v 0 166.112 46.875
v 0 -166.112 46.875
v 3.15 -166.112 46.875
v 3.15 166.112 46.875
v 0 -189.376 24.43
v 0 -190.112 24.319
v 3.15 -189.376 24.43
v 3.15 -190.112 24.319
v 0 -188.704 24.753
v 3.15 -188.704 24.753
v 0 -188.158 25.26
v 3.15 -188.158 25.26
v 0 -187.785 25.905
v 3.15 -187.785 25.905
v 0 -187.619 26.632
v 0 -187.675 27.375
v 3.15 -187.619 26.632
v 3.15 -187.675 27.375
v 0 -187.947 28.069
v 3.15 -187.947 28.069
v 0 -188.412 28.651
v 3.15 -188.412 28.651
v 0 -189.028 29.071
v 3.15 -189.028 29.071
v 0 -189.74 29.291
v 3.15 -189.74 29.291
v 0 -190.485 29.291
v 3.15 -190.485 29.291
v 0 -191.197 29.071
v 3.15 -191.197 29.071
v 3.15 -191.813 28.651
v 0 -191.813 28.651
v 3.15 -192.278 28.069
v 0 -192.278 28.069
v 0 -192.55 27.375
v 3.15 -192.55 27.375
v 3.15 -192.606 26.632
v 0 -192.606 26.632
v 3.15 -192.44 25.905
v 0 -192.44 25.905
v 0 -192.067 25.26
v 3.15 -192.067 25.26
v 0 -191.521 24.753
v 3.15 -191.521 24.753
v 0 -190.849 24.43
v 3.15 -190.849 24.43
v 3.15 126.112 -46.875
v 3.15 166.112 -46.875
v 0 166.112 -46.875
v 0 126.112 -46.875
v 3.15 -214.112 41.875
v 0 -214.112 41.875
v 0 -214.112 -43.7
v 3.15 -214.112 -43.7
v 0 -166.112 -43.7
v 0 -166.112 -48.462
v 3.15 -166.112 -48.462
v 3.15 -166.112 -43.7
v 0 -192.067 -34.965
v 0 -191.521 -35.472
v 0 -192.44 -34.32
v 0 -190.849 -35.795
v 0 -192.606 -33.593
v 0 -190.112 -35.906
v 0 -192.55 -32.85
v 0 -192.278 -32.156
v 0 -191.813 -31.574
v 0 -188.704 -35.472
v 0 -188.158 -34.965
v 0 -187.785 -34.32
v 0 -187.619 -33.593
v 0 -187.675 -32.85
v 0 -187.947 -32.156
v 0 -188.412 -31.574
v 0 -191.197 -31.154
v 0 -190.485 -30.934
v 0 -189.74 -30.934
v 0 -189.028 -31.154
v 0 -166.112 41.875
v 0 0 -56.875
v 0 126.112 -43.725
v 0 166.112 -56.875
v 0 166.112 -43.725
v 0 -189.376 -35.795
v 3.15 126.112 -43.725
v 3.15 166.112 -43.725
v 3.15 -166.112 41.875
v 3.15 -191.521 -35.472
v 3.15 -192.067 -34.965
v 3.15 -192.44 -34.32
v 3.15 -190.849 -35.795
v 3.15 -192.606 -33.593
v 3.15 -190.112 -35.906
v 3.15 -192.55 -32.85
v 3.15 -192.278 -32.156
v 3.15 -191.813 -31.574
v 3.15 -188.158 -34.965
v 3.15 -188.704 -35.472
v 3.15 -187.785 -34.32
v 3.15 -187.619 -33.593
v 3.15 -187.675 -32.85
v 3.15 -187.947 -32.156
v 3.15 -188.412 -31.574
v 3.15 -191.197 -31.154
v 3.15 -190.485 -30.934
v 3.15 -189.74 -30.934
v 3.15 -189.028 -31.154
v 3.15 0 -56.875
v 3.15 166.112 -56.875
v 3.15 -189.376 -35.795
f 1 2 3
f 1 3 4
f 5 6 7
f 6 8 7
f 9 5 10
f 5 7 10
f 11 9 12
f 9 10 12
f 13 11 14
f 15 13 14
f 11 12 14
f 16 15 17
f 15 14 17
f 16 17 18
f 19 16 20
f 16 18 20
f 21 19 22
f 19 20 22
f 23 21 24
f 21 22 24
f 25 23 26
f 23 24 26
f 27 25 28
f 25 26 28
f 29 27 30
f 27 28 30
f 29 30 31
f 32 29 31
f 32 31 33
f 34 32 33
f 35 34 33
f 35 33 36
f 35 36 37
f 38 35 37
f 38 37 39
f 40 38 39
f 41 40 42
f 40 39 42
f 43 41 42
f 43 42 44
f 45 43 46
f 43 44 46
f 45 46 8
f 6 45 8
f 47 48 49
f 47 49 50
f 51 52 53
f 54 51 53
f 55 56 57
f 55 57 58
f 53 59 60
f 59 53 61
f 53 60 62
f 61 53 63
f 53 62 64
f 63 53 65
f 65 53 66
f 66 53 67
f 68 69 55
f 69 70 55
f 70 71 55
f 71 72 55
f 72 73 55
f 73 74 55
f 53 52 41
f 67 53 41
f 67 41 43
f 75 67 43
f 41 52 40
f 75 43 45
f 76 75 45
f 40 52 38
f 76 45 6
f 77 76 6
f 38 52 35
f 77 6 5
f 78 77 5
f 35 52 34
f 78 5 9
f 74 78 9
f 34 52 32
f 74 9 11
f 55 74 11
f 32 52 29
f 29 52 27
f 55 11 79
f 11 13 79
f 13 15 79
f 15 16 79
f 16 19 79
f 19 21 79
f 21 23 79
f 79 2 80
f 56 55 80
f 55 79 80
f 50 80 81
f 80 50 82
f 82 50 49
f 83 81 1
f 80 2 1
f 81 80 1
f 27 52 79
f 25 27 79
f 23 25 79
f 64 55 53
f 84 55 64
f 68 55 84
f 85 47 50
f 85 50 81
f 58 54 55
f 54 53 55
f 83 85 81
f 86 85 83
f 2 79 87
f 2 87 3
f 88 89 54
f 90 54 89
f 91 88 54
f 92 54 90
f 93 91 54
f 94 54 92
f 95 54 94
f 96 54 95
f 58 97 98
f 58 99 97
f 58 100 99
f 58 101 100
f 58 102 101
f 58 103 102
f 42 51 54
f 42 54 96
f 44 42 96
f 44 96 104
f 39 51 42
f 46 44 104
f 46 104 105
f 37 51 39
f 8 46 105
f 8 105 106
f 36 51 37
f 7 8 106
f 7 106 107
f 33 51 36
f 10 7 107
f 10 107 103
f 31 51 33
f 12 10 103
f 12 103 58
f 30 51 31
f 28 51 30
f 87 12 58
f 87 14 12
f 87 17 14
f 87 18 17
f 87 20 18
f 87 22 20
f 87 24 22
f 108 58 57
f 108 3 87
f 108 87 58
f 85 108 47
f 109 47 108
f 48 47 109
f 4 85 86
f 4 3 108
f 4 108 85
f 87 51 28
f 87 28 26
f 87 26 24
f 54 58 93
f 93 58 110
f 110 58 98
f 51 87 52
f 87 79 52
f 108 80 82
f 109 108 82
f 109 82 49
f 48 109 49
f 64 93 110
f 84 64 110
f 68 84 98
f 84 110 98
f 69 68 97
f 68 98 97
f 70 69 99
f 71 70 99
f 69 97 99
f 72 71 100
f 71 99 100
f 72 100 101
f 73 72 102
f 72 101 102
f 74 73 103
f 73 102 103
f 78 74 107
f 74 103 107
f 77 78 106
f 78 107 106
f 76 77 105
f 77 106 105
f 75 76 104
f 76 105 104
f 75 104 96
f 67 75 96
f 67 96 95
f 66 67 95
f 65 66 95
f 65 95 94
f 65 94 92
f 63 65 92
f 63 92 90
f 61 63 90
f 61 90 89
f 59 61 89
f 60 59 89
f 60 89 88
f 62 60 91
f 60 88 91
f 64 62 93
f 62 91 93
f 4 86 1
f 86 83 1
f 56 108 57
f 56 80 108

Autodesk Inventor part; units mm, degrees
ref_plane "YZ Plane" through (0, 0, 0) normal (1, 0, 0) x (0, 1, 0)
ref_plane "XZ Plane" through (0, 0, 0) normal (0, 1, 0) x (-1, 0, 0)
ref_plane "XY Plane" through (0, 0, 0) normal (0, 0, 1) x (1, 0, 0)
sketch "Sketch2" plane through (0, 0, 0) normal (1, 0, 0) x (0, 1, 0)
  line L0 (166.1125, -46.875) -> (-166.1125, -46.875)
  line L1 (-166.1125, -46.875) -> (-166.1125, 46.875)
  line L2 (-166.1125, 46.875) -> (166.1125, 46.875)
  line L3 (166.1125, 46.875) -> (166.1125, -46.875)
  line L4 (166.1125, -46.875) -> (-166.1125, 46.875) construction
  line L5 (-166.1125, -46.875) -> (166.1125, 46.875) construction
  line L6 (-166.1125, 41.875) -> (-214.1125, 41.875)
  line L7 (-214.1125, 41.875) -> (-214.1125, -43.7)
  line L8 (-214.1125, -43.7) -> (-166.1125, -43.7)
  line L9 (-166.1125, -43.7) -> (-166.1125, 41.875)
  line L10 (166.1125, -46.875) -> (0, -46.875)
  line L11 (0, -46.875) -> (0, -56.875)
  line L12 (0, -56.875) -> (166.1125, -56.875)
  line L13 (166.1125, -56.875) -> (166.1125, -46.875)
  line L14 (0, 0) -> (0, -46.875)
  line L15 (-166.1125, 46.875) -> (-169.2875, 46.875)
  line L16 (-169.2875, 46.875) -> (-169.2875, 41.875)
  line L17 (-169.2875, 41.875) -> (-166.1125, 41.875)
  line L18 (-166.1125, 41.875) -> (-166.1125, 46.875)
  line L19 (-214.1125, 41.875) -> (-171.6688, 41.875)
  line L20 (-171.6688, 41.875) -> (-171.6688, 46.875)
  line L21 (-171.6688, 46.875) -> (-214.1125, 46.875)
  line L22 (-214.1125, 46.875) -> (-214.1125, 41.875)
  line L23 (-214.1125, 46.875) -> (-173.6687, 46.875)
  line L24 (-173.6687, 46.875) -> (-173.6687, 51.875)
  line L25 (-173.6687, 51.875) -> (-214.1125, 51.875)
  line L26 (-214.1125, 51.875) -> (-214.1125, 46.875)
  line L27 (-171.6688, 46.875) -> (-173.6687, 51.875)
  line L28 (-166.1125, -46.875) -> (0, -46.875)
  line L29 (0, -46.875) -> (0, -48.4625)
  line L30 (0, -48.4625) -> (-166.1125, -48.4625)
  line L31 (-166.1125, -48.4625) -> (-166.1125, -46.875)
  line L32 (0, -56.875) -> (-166.1125, -48.4625)
  dimension "d0" = 332.225
  dimension "d1" = 93.75
  dimension "d6" = 3.175
  dimension "d7" = 5
  dimension "d8" = 48
  dimension "d9" = 10
  dimension "d17" = 0
  dimension "d18" = 3.175
  dimension "d19" = 2.3813
  dimension "d20" = 5
  dimension "d21" = 2
  dimension "d22" = 1.5875
extrude "Extrusion1" add sketch "Sketch2" along normal blind 3.15 contours L13 L12 L11 L0 | L0 L1 L2 L3 | L11 L30 L31 L0 | L11 L32 L30 | L8 L7 L6 L1
sketch "Sketch3" plane through (3.15, 0, 0) normal (1, 0, 0) x (0, 0, -1)
  line L0 (56.875, 0) -> (56.875, 166.1125) projected
  line L1 (56.875, 166.1125) -> (-46.875, 166.1125) projected
  line L2 (43.725, 166.1125) -> (46.875, 166.1125)
  line L3 (46.875, 166.1125) -> (46.875, 126.1125)
  line L4 (46.875, 126.1125) -> (43.725, 126.1125)
  line L5 (43.725, 126.1125) -> (43.725, 166.1125)
  line L6 (-41.875, -166.1125) -> (-41.875, -214.1125) projected
  line L7 (-41.875, -214.1125) -> (43.7, -214.1125) projected
  circle A0 centre (-26.8187, -190.1125) radius 2.5
  line L8 (48.4625, -166.1125) -> (-41.875, -166.1125)
  line L9 (-41.875, -166.1125) -> (-41.875, -214.1125)
  line L10 (-41.875, -214.1125) -> (48.4625, -214.1125)
  line L11 (48.4625, -214.1125) -> (48.4625, -166.1125)
  line L12 (3.2938, -214.1125) -> (3.2938, -166.1125)
  circle A1 centre (33.4063, -190.1125) radius 2.5
  point P0 (0, 0)
  point P1 (-41.875, -169.2875)
  point P2 (-41.875, -171.6688)
  dimension "d11" = 40
  dimension "d12" = 3.15
  dimension "d13" = 10
  dimension "d23" = 5
  dimension "d24" = 24
  dimension "d25" = 30.1125
extrude "Extrusion2" cut sketch "Sketch3" against normal blind 10 contours L3 L4 L5 L1 | A0 | A1
equation "\"d0\" = window_z"
equation "\"d1\" = window_y"
equation "\"d6\" = 2 * sm_thickness"
equation "\"d7\" = acrylic_into_frame"
equation "\"d8\" = window_overlap"
equation "\"d9\" = protection_slot_width"
equation "\"d18\" = 2 * sm_thickness"
equation "\"d19\" = 1.5 * sm_thickness"
equation "\"d22\" = sm_thickness"
equation "\"d2\" = clear_acrylic"
equation "\"d11\" = 0.5 * protection_slot_length"
equation "\"d12\" = clear_acrylic"
equation "\"d13\" = protection_slot_width"
equation "\"d23\" = m5_diameter"
equation "\"d24\" = 0.5 * window_overlap"
equation "\"d25\" = 0.333333 * drawer_y"
equation "\"sm_thickness\" = 1.5875"
equation "\"very_thick_acrylic\" = 9.45"
equation "\"thick_acrylic\" = 5.88"
equation "\"thin_acrylic\" = 3.15"
equation "\"clear_acrylic\" = 3.15"
equation "\"wood_thickness\" = 6.72"
equation "\"m3_diameter\" = 3"
equation "\"m4_diameter\" = 4"
equation "\"m5_diameter\" = 5"
equation "\"brass_insert_drill\" = 4"
equation "\"m5_brass_insert_drill\" = 6.7"
equation "\"m3_main_length\" = 14"
equation "\"m3_main_nut_width\" = 5.7"
equation "\"m3_main_nut_thickness\" = 2.5"
equation "\"m3_main_extra\" = 1"
equation "\"stepper_screw_space\" = 35"
equation "\"stepper_shaft_diameter\" = 5"
equation "\"stepper_body_diameter\" = 28"
equation "\"laser_body_diameter\" = 12"
equation "\"carrier_y\" = 251"
equation "\"carrier_z\" = 12"
equation "\"visor_x\" = 253.925"
equation "\"visor_y\" = 85.6"
equation "\"protection_slot\" = 44.2"
equation "\"protection_slot_offset\" = 55.25"
equation "\"window_z\" = 332.225"
equation "\"tray_border\" = 25"
equation "\"bed_z\" = 25"
equation "\"reservoir_x\" = 201"
equation "\"crane_z2\" = 12"
equation "\"tray_y\" = 251"
equation "\"door_sensor\" = 35"
equation "\"linear_bearing_spacing\" = 271"
equation "\"motor_spacing\" = 337"
equation "\"tray_x\" = 251"
equation "\"reservoir_y\" = 201"
equation "\"window_y\" = 93.75"
equation "\"end_stop_spacing\" = 19"
equation "\"window_overlap\" = 48"
equation "\"door_z\" = 332.225"
equation "\"door_x\" = 251"
equation "\"door_overlap\" = 48"
equation "\"acrylic_into_frame\" = 5"
equation "\"protection_slot_width\" = 10"
equation "\"laser_z_offset\" = 55"
equation "\"galvo_frame_x\" = 66"
equation "\"galvo_frame_z\" = 85"
equation "\"laser_y_offset\" = 19.4"
equation "\"thumb_nut_diameter\" = 7"
equation "\"drawer_y\" = 90.3375"
equation "\"frame_total_z\" = 661.5875"
equation "\"printer_z\" = 289"
equation "\"subframe_y_offset\" = 27.5"
equation "\"frame_bottom_z\" = 275"
equation "\"lcd_y\" = 25"
equation "\"drawer_x\" = 257.3"
equation "\"drawer_z\" = 278.175"
equation "\"drawer_z_from_bottom\" = 25"
equation "\"t_galvo_frame\" = 6.72"
equation "\"laser_z\" = 75"
equation "\"nema17_x\" = 43"
equation "\"thumb_nut_offset_y\" = 0"
equation "\"laser_y\" = 15"
equation "\"frame_tilt\" = 1deg"
equation "\"frame_top_z\" = 385"
equation "\"frame_border\" = 48.0375"
equation "\"laser_diameter\" = 12"
equation "\"galvo_frame_y_offset\" = 27.5"
equation "\"lcd_x\" = 72"
equation "\"subframe_x\" = 66"
equation "\"frame_foot_z\" = 12"
equation "\"z_min_from_center\" = 115"
equation "\"m3_press_nut_drill\" = 4.5"
equation "\"m3_head\" = 6"
equation "\"m5_head\" = 10.3"
equation "\"m5_press_nut_drill\" = 6.5"
equation "\"drawer_support_from_top\" = 48"
equation "\"laser_gap\" = 1"
equation "\"frame_screw_from_center\" = 25"
equation "\"drawer_screw_from_center\" = 55"
equation "\"frame_face_y\" = 45"
equation "\"switch_spacing\" = 19"
equation "\"subframe_y\" = 55"
equation "\"al_thickness\" = 1.5875"
equation "\"rivet_diameter\" = 3.3"
equation "\"bend_factor\" = 2.26205"
equation "\"sm_bend\" = 3.591"
equation "\"al_bend\" = 3.591"
equation "\"frame_x\" = 353.375"
equation "\"carrier_z2\" = 25"
equation "\"carrier_y2\" = 76.825"
equation "\"protection_slot_length\" = 80"
properties part number "window"
